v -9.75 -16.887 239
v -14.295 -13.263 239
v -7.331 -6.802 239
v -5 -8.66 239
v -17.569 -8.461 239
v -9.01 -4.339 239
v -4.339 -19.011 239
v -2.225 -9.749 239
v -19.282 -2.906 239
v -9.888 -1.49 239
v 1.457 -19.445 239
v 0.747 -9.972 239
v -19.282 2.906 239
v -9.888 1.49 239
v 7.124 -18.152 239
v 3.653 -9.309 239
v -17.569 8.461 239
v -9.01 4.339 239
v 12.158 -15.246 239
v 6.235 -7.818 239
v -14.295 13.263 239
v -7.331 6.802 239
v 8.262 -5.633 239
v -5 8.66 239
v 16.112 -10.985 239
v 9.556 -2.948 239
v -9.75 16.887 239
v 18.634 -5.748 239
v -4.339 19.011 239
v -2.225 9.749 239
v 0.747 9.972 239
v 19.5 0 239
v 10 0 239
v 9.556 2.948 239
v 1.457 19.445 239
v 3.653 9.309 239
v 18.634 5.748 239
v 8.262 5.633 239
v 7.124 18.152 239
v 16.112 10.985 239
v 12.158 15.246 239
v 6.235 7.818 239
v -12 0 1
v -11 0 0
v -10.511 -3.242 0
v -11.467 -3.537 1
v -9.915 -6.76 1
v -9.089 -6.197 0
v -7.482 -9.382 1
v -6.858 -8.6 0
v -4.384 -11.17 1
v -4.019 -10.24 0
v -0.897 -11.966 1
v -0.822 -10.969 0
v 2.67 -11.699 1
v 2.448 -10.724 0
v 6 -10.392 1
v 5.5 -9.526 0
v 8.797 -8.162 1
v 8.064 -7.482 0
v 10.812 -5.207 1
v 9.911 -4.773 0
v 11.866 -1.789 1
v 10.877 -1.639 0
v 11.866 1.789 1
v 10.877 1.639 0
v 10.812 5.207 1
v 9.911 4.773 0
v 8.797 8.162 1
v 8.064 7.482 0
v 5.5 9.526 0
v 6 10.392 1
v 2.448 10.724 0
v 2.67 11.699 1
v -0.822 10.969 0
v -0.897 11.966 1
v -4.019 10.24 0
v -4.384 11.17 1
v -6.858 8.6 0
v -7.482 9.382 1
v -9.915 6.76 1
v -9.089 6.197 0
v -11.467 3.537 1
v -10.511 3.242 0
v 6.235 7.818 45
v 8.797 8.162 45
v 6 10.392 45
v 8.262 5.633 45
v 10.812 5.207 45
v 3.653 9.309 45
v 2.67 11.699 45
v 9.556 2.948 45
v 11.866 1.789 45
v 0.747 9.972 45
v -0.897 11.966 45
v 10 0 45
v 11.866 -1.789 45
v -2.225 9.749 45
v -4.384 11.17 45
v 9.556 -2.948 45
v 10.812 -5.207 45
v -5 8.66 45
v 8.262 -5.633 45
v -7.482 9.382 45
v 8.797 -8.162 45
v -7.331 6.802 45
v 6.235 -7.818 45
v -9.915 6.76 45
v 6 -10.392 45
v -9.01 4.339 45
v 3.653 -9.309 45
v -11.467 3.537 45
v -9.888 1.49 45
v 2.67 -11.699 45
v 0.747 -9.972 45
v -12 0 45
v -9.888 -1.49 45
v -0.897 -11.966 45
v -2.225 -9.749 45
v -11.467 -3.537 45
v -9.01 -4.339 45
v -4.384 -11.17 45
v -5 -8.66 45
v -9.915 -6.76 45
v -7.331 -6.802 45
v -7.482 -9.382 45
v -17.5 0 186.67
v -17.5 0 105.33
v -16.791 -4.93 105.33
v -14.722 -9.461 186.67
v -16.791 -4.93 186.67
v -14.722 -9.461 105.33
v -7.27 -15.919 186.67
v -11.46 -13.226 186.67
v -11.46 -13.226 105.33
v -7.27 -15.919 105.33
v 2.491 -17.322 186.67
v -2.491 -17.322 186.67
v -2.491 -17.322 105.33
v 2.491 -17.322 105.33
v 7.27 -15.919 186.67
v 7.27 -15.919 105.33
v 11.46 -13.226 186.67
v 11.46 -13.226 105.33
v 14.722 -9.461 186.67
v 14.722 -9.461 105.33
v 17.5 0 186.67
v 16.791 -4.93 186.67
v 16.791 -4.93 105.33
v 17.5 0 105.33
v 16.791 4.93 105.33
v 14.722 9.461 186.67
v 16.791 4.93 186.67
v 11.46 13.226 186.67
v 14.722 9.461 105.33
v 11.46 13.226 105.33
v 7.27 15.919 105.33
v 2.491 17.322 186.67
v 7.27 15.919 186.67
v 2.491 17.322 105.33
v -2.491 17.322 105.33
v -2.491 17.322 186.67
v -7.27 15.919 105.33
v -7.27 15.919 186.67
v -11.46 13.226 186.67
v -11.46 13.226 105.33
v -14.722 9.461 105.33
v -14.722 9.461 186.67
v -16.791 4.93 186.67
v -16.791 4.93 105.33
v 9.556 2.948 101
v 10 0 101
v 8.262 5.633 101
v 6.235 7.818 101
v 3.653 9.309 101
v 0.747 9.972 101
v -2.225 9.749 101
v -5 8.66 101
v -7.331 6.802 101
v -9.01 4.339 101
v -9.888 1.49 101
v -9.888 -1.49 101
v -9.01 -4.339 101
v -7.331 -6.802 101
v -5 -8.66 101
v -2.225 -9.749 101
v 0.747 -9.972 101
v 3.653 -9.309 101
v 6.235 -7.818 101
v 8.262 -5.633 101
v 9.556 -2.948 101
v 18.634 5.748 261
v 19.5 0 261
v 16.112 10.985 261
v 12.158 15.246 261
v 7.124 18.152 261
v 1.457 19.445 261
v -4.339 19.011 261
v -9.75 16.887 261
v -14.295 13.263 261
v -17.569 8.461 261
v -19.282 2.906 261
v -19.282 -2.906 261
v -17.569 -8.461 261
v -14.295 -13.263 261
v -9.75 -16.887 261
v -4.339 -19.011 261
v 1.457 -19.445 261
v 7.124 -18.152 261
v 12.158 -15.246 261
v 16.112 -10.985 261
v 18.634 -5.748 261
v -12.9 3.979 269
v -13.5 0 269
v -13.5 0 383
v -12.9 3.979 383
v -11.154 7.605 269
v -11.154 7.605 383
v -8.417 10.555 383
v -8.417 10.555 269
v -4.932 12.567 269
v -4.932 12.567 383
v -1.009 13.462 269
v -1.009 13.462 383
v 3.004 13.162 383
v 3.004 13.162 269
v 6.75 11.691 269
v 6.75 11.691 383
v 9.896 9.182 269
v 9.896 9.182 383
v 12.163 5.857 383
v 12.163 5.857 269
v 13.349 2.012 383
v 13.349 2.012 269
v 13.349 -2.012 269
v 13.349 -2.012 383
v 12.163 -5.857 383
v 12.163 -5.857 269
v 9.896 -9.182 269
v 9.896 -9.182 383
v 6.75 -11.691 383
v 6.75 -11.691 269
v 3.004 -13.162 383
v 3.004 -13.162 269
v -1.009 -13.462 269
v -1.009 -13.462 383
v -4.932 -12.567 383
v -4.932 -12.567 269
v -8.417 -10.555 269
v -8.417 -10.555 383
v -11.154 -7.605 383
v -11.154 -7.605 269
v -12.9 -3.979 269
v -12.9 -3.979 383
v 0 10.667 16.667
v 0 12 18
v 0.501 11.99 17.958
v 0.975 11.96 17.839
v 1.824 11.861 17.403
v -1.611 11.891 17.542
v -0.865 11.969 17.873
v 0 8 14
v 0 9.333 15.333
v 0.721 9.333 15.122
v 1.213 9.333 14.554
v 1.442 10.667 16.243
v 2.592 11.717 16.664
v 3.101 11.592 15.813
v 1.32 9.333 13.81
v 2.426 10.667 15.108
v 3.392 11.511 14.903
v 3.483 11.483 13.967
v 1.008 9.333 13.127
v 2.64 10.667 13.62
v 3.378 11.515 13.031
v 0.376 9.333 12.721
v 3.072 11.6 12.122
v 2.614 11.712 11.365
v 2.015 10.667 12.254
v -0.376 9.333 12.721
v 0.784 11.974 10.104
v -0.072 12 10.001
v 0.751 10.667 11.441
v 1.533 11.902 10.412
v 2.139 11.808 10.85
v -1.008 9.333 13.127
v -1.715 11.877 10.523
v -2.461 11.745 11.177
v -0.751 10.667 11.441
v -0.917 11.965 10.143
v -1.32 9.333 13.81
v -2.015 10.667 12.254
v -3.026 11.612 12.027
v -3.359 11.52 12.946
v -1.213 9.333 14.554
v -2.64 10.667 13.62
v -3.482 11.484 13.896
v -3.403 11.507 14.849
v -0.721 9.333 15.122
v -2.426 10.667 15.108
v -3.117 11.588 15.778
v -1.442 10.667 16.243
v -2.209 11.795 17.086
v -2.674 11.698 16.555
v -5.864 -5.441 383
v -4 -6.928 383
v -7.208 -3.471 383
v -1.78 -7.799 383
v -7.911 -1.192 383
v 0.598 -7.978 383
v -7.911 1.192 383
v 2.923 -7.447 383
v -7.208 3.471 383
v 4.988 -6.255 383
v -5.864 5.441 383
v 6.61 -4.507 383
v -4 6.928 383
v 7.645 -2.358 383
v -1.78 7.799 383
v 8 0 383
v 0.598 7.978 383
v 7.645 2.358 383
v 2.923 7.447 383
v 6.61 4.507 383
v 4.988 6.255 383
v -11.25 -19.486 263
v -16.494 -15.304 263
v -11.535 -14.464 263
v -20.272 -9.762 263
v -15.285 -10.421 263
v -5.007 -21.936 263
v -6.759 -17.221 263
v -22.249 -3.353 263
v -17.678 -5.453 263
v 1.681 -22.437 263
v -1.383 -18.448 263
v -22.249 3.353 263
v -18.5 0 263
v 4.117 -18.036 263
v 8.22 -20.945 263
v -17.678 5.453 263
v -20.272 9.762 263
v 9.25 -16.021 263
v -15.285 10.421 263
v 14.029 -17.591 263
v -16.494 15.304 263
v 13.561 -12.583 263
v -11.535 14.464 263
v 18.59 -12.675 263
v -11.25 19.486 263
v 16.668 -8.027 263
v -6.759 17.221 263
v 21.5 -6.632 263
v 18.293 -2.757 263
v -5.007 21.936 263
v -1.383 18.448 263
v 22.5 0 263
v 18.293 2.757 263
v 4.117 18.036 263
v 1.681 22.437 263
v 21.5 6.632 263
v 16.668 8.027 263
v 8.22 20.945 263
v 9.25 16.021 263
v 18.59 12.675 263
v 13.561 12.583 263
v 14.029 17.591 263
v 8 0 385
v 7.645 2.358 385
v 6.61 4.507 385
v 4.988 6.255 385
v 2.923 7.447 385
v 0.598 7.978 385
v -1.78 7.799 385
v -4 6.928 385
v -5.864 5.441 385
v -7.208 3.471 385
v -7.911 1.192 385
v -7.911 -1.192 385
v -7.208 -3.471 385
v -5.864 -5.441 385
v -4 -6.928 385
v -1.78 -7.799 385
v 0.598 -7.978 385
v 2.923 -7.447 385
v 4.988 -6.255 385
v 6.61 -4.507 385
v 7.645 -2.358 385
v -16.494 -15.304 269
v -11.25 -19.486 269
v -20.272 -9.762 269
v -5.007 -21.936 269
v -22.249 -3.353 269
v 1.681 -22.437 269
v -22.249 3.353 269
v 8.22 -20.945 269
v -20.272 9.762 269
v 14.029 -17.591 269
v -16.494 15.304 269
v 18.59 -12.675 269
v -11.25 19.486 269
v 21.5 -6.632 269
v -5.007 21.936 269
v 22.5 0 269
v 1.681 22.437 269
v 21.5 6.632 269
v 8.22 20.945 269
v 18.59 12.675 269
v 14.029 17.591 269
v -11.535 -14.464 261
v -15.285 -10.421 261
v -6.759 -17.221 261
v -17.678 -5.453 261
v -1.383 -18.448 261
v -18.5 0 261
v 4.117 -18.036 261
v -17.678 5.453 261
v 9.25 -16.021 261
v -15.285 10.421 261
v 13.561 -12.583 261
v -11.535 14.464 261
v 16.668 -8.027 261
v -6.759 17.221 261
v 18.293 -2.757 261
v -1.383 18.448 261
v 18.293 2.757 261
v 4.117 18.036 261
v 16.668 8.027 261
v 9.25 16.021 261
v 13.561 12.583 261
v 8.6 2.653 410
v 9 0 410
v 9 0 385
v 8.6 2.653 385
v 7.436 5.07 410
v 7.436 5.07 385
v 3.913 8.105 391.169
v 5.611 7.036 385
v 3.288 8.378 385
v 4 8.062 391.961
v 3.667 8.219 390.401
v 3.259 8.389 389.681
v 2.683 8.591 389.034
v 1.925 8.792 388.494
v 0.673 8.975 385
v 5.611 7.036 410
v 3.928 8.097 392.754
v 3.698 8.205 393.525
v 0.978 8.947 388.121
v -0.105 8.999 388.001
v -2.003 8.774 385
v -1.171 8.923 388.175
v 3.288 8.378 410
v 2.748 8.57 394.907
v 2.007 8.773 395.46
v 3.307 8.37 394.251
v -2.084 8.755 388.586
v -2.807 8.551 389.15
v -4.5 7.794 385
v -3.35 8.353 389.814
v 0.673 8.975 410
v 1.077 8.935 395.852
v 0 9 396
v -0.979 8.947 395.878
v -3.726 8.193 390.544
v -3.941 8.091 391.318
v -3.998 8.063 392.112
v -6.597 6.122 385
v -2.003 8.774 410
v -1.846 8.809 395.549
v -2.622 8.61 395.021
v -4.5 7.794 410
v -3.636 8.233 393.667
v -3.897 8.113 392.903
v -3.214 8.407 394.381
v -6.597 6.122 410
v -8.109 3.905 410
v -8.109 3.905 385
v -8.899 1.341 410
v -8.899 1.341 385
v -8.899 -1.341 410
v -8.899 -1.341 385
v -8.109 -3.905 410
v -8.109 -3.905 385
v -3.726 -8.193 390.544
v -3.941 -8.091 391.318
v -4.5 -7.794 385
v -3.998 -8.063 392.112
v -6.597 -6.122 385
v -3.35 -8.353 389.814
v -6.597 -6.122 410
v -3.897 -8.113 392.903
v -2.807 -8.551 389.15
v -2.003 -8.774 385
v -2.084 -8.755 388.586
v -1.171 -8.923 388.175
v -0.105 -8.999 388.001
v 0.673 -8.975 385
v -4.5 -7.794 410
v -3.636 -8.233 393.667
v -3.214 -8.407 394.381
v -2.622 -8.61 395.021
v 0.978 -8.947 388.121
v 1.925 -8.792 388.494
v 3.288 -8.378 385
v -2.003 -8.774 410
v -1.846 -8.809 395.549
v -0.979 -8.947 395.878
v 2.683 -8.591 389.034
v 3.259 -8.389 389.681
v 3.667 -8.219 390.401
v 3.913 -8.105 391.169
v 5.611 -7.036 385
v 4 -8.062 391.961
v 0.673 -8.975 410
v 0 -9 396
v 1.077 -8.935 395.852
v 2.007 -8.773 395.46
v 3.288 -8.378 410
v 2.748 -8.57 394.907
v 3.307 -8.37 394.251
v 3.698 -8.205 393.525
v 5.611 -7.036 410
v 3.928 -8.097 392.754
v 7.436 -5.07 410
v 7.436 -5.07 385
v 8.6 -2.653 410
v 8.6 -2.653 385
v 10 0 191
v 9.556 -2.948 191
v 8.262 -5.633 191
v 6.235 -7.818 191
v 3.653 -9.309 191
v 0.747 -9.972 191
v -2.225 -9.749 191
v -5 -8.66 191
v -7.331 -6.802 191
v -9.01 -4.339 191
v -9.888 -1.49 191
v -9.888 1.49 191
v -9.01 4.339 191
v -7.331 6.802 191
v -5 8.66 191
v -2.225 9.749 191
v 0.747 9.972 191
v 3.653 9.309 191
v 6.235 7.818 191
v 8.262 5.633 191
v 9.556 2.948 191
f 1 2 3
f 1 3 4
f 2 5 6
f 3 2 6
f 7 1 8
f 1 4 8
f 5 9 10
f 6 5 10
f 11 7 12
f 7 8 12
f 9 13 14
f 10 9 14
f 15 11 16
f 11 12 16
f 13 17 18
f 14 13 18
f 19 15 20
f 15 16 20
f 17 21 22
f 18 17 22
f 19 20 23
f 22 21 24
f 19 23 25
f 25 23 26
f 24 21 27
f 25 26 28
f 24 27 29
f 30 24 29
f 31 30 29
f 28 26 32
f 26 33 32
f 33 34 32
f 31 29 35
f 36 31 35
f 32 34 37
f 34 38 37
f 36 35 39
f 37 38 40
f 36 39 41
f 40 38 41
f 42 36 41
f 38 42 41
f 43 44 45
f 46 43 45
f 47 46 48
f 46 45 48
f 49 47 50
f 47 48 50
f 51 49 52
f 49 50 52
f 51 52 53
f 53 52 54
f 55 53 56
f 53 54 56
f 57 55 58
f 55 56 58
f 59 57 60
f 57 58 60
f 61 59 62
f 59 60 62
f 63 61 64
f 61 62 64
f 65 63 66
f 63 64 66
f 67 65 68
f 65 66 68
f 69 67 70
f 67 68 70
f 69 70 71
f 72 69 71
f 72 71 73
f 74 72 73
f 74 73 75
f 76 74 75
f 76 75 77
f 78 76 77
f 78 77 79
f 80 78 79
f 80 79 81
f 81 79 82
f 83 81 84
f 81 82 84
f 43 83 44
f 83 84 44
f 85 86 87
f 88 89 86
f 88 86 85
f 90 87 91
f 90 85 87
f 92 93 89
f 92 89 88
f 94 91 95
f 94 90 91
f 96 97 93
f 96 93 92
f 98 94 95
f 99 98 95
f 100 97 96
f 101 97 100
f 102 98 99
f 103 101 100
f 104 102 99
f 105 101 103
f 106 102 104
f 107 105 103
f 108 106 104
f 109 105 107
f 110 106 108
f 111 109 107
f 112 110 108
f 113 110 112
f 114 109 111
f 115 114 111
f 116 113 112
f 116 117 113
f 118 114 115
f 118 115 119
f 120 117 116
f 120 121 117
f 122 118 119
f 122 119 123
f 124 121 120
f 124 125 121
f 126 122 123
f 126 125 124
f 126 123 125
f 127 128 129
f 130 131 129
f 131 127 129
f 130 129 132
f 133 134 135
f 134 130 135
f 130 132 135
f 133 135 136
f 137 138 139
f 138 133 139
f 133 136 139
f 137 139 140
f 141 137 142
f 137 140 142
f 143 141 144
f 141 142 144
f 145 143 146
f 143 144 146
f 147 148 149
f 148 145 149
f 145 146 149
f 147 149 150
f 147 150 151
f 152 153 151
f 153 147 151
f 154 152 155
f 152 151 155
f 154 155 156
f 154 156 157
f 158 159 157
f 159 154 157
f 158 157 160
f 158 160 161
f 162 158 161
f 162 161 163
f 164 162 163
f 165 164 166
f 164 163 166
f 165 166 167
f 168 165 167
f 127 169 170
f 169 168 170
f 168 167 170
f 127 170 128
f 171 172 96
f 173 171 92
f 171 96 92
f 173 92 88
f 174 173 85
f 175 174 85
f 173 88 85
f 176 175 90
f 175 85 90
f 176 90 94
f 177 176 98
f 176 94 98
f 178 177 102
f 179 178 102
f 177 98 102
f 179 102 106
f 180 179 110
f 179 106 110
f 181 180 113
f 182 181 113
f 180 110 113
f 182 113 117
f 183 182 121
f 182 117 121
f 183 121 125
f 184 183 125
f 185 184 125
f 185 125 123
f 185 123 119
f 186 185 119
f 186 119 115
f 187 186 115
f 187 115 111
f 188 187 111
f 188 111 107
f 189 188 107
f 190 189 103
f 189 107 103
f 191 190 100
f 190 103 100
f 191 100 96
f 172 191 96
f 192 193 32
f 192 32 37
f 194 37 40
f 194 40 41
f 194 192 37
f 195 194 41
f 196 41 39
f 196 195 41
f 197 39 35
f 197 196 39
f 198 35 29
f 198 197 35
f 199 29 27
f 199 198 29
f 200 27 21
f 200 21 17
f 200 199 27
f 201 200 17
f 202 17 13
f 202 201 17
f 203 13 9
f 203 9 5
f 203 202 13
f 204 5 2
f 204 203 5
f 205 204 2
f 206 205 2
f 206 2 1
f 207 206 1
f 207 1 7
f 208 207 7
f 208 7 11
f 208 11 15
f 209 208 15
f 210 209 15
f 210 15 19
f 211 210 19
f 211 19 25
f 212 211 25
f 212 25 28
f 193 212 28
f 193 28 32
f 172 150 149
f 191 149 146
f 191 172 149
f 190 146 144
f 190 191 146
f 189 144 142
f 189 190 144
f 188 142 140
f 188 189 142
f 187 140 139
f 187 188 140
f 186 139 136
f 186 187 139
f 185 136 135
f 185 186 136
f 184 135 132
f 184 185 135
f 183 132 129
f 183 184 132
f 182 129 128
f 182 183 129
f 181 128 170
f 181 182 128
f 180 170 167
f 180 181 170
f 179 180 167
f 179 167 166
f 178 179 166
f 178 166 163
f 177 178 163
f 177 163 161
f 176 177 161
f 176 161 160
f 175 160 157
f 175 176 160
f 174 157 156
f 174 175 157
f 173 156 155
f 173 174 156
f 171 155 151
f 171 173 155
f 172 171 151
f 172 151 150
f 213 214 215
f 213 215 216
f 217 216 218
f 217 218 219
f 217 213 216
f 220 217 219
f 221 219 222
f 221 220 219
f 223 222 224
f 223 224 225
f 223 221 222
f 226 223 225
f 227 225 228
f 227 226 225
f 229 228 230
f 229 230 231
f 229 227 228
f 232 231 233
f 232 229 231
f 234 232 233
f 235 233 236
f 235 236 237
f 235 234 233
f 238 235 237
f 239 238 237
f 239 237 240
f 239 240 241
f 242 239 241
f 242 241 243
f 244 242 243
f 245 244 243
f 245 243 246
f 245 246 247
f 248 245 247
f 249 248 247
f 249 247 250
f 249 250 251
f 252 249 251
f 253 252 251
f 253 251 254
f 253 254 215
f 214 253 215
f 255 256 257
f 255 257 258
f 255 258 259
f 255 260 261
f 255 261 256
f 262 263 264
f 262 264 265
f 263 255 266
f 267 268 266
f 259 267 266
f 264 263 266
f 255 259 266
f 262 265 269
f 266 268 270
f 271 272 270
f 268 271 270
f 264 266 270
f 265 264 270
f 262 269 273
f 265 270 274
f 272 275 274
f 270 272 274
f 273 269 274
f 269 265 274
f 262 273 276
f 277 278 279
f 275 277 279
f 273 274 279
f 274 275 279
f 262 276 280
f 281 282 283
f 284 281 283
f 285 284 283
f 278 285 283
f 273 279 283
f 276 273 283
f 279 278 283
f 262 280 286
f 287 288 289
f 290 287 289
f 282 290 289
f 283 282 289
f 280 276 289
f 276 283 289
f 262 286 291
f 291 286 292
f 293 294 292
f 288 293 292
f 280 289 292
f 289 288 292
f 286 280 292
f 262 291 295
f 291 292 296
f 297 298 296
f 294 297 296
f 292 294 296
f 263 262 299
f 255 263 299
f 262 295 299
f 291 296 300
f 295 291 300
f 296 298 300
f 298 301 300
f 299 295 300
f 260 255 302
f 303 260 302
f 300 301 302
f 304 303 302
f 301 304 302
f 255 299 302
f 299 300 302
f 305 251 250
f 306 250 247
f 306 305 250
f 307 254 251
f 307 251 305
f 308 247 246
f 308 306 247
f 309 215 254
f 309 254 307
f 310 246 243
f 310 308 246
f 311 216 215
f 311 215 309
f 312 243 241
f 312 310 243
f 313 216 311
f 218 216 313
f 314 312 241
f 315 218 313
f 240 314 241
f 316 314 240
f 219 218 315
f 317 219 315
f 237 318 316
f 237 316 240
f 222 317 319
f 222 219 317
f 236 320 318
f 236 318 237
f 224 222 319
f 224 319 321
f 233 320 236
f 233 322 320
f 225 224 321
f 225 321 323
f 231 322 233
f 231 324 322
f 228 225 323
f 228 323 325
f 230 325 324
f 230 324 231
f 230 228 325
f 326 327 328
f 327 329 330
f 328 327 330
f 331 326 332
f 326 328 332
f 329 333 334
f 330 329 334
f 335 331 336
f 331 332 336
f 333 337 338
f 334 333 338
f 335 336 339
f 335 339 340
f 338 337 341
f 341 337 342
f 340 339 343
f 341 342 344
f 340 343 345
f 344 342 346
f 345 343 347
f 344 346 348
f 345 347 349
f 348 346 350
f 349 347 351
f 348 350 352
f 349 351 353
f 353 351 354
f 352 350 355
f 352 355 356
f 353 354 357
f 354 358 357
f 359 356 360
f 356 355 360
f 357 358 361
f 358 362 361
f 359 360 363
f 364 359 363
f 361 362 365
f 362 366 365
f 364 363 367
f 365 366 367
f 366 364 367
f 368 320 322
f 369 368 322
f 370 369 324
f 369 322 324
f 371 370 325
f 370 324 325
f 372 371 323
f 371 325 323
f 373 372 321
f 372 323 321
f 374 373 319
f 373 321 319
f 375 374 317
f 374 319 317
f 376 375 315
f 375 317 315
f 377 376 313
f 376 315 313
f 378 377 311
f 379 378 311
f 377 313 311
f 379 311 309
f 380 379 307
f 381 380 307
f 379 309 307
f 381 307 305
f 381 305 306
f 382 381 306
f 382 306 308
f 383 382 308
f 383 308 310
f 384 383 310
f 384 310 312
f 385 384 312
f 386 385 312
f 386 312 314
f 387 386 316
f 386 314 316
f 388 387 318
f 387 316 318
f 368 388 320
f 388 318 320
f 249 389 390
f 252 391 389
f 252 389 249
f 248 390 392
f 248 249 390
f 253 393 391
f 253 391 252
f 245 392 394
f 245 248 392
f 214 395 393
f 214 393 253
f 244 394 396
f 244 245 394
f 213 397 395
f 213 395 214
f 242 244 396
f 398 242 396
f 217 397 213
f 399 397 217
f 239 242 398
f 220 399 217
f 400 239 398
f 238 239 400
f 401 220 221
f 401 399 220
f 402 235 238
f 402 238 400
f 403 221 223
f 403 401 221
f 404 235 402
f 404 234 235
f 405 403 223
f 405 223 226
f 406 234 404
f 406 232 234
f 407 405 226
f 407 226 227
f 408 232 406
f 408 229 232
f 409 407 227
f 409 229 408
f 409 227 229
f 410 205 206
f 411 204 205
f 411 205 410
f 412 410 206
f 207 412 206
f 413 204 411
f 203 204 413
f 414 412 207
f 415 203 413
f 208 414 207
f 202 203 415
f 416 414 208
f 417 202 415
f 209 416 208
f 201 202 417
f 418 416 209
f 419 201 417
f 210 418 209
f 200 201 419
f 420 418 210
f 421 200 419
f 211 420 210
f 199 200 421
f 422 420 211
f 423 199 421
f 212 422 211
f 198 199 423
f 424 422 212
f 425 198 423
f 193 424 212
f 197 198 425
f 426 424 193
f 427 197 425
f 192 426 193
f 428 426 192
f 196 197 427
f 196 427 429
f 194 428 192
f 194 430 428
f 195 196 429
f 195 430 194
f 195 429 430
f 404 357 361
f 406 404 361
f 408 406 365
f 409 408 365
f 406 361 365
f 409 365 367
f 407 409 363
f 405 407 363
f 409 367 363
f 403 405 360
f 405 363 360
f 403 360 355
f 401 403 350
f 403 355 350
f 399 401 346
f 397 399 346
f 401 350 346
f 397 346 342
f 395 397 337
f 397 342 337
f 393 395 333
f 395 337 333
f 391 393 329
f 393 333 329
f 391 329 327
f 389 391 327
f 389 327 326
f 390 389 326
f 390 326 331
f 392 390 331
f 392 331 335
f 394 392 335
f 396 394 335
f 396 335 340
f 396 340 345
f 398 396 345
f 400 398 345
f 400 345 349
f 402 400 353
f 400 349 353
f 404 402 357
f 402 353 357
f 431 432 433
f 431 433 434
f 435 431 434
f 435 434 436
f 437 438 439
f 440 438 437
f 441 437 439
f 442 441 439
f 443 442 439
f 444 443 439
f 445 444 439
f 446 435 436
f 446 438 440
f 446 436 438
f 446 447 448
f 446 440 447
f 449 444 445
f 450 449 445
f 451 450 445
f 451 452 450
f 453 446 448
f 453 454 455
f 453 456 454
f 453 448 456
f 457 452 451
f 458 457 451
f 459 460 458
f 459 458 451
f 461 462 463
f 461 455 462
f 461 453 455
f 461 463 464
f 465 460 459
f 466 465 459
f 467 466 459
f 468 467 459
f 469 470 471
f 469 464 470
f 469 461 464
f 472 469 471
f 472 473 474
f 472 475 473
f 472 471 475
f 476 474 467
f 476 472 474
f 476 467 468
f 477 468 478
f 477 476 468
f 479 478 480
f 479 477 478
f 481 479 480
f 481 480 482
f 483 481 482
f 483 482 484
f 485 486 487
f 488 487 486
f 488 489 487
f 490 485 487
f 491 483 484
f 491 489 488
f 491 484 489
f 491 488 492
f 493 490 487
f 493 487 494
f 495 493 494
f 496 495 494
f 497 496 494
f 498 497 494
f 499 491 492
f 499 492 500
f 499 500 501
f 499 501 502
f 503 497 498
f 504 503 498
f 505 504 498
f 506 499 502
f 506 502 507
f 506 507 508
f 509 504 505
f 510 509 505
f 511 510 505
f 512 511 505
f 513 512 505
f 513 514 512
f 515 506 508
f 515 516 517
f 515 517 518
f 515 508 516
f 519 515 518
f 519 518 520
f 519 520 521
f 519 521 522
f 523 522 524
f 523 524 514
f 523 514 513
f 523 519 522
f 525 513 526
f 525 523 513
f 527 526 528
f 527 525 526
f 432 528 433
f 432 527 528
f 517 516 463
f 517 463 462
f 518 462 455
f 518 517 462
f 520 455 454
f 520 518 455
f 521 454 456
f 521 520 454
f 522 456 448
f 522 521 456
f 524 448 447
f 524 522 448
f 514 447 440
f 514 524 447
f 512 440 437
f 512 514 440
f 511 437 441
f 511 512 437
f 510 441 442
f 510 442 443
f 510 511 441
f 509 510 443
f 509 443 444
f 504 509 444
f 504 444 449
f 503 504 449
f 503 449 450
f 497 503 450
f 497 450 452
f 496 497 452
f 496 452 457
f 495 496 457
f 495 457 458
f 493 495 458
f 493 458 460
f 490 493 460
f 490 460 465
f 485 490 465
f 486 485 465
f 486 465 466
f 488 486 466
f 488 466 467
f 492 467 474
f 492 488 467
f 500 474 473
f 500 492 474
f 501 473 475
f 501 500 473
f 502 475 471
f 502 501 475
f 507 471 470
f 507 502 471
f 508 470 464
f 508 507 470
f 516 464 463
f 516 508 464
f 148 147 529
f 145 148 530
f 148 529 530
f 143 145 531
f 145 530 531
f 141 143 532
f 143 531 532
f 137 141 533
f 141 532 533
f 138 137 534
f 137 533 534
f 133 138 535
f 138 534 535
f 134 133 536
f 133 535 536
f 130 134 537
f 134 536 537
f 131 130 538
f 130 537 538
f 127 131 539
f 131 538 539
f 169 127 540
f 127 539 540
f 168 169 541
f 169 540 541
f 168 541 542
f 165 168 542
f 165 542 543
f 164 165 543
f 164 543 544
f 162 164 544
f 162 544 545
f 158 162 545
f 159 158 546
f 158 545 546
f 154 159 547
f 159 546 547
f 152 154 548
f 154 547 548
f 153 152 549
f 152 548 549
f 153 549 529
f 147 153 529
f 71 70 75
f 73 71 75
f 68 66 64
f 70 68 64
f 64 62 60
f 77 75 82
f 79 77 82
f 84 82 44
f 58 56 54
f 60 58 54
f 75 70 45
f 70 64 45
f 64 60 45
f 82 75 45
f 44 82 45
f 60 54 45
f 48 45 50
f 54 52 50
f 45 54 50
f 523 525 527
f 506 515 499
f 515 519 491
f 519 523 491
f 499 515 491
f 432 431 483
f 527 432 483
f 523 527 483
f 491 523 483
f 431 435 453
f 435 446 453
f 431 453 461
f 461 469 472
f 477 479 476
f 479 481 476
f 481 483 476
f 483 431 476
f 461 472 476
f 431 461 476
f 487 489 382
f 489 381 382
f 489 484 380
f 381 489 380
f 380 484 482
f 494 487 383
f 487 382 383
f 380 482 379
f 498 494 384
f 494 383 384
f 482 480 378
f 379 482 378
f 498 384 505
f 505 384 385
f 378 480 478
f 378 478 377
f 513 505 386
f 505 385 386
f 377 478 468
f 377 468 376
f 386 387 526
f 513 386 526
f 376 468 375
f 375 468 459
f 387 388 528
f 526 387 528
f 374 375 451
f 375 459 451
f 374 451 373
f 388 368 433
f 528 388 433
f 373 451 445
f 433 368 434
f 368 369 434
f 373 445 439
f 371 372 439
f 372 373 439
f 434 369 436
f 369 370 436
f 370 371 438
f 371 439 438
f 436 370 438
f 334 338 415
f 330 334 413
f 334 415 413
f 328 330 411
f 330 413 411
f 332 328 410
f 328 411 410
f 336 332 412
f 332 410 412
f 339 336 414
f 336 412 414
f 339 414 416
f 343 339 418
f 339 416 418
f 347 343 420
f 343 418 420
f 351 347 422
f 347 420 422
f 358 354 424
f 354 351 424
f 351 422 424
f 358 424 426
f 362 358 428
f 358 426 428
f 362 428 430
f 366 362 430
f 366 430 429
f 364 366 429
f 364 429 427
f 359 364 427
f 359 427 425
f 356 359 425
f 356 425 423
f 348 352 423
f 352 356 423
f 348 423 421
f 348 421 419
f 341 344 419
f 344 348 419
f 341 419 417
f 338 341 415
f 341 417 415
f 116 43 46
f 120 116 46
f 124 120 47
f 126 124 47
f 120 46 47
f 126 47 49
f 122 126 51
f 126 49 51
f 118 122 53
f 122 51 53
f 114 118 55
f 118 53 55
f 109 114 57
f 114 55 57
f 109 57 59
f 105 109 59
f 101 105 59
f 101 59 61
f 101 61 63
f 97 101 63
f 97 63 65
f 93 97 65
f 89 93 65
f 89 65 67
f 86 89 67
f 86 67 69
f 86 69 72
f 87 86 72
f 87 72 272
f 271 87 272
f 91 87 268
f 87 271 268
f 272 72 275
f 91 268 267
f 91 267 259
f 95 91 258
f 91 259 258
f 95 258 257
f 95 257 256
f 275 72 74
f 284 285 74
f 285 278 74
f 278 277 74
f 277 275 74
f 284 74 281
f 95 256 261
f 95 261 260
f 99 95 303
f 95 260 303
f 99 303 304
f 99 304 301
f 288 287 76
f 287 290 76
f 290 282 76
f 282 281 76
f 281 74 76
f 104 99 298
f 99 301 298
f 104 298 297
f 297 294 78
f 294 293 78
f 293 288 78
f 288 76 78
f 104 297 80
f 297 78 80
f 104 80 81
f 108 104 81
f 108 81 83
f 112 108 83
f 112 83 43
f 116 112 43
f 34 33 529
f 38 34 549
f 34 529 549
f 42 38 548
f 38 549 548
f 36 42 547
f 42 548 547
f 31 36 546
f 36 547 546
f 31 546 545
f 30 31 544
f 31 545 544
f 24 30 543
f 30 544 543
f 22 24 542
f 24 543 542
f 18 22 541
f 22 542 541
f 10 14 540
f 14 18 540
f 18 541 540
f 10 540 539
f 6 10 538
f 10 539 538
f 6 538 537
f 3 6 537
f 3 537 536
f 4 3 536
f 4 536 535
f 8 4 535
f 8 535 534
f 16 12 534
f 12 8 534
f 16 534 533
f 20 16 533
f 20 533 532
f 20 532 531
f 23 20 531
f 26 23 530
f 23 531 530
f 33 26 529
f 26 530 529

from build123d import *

# Parameters (mm, degrees)
SKETCH_1_R               = 12
EXTRUDE_1_DEPTH          = 45
SKETCH_2_R               = 10
EXTRUDE_2_DEPTH          = 56
SKETCH_3_R               = 17.5
EXTRUDE_3_DEPTH          = 90
SKETCH_4_R               = 10
EXTRUDE_4_DEPTH          = 72
SKETCH_5_R               = 19.5
EXTRUDE_5_DEPTH          = 24
CUT_EXTRUDE_1_DEPTH      = 265.441865067
CUT_EXTRUDE_1_DEPTH_BACK = 2
SKETCH_6_OUTSIDE_W       = 94.744
SKETCH_6_OUTSIDE_H       = 94.744
SKETCH_6_OUTSIDE_R       = 18.5
SKETCH_7_R               = 22.5
EXTRUDE_6_DEPTH          = 6
SKETCH_8_R               = 13.5
EXTRUDE_7_DEPTH          = 147
SKETCH_10_OUTSIDE_W      = 129.982
SKETCH_10_OUTSIDE_H      = 129.982
SKETCH_10_OUTSIDE_R      = 9
CUT_EXTRUDE_2_DEPTH      = 27
SKETCH_11_OUTSIDE_W      = 129.982
SKETCH_11_OUTSIDE_H      = 129.982
SKETCH_11_OUTSIDE_R      = 8
CUT_EXTRUDE_3_DEPTH      = 2
CHAMFER_1_SIZE           = 1
CUT_EXTRUDE_4_DEPTH      = 412.23290238
CUT_EXTRUDE_4_DEPTH_BACK = 412.23290238
SKETCH_15_R              = 4


with BuildPart() as part:
    # 草图1 → 凸台-拉伸1 (new body)
    with BuildSketch(Plane.XY):
        with Locations(Location((0, 0, 0), (0, 0, 180))):
            Circle(SKETCH_1_R)
    extrude(amount=EXTRUDE_1_DEPTH)

    # 草图2 → 凸台-拉伸2 (add)
    with BuildSketch(Plane.XY.offset(45)):
        Circle(SKETCH_2_R)
    extrude(amount=EXTRUDE_2_DEPTH)

    # 草图3 → 凸台-拉伸3 (add)
    with BuildSketch(Plane.XY.offset(101)):
        with Locations(Location((0, 0, 0), (0, 0, 180))):
            Circle(SKETCH_3_R)
    extrude(amount=EXTRUDE_3_DEPTH)

    # 草图4 → 凸台-拉伸4 (add)
    with BuildSketch(Plane.XY.offset(191)):
        Circle(SKETCH_4_R)
    extrude(amount=EXTRUDE_4_DEPTH)

    # 草图5 → 凸台-拉伸5 (add)
    with BuildSketch(Plane.XY.offset(263)):
        Circle(SKETCH_5_R)
    extrude(amount=-EXTRUDE_5_DEPTH)

    # 草图6 outside → 切除-拉伸1 (cut, two sides: drawn at the far end of the back side and taken through both)
    with BuildSketch(Plane.XY.offset(263).offset(-CUT_EXTRUDE_1_DEPTH_BACK)):
        Rectangle(SKETCH_6_OUTSIDE_W, SKETCH_6_OUTSIDE_H)
        with Locations(Location((0, 0, 0), (0, 0, 180))):
            Circle(SKETCH_6_OUTSIDE_R, mode=Mode.SUBTRACT)
    extrude(amount=CUT_EXTRUDE_1_DEPTH + CUT_EXTRUDE_1_DEPTH_BACK, mode=Mode.SUBTRACT)

    # 草图7 → 凸台-拉伸6 (add)
    with BuildSketch(Plane.XY.offset(263)):
        Circle(SKETCH_7_R)
    extrude(amount=EXTRUDE_6_DEPTH)

    # 草图8 → 凸台-拉伸7 (add)
    with BuildSketch(Plane(origin=(0, 0, 263), x_dir=(-1, 0, 0), z_dir=(0, 0, -1))):
        Circle(SKETCH_8_R)
    extrude(amount=-EXTRUDE_7_DEPTH)

    # 草图10 outside → 切除-拉伸2 (cut)
    with BuildSketch(Plane.XY.offset(410)):
        Rectangle(SKETCH_10_OUTSIDE_W, SKETCH_10_OUTSIDE_H)
        Circle(SKETCH_10_OUTSIDE_R, mode=Mode.SUBTRACT)
    extrude(amount=-CUT_EXTRUDE_2_DEPTH, mode=Mode.SUBTRACT)

    # 草图11 outside → 切除-拉伸3 (cut)
    with BuildSketch(Plane.XY.offset(383)):
        Rectangle(SKETCH_11_OUTSIDE_W, SKETCH_11_OUTSIDE_H)
        Circle(SKETCH_11_OUTSIDE_R, mode=Mode.SUBTRACT)
    extrude(amount=CUT_EXTRUDE_3_DEPTH, mode=Mode.SUBTRACT)

    # 草图12 → 切除-旋转1 (revolve, cut)
    with BuildSketch(Plane(origin=(0, 0, 0), x_dir=(0, 0, -1), z_dir=(1, 0, 0)), mode=Mode.PRIVATE) as cut_revolve_1_sk:
        Polygon((-105.330127019, 17.5), (-101, 10), (-101, 17.5), align=None)
        Polygon((-191, 10), (-191, 17.5), (-186.669872981, 17.5), align=None)
    revolve(cut_revolve_1_sk.sketch.rotate(Axis((0, 0, 181.277430572), (0, 0, -1)), 90), axis=Axis((0, 0, 181.277430572), (0, 0, -1)), mode=Mode.SUBTRACT)

    # 倒角1
    chamfer_1_edges = [part.edges().sort_by_distance(p)[0] for p in [
        (12, 0, 0),
    ]]
    chamfer(chamfer_1_edges, length=CHAMFER_1_SIZE)

    # 草图14 → 切除-旋转2 (revolve, cut)
    with BuildSketch(Plane(origin=(0, 0, 0), x_dir=(0, 0, -1), z_dir=(1, 0, 0))):
        Polygon((-14, 8), (-23.293093205, 17.293093205), (-14, 17.293093205), align=None)
    revolve(axis=Axis((0, -18.394712119, 14), (0, 1, 0)), mode=Mode.SUBTRACT)

    # 草图15 → 切除-拉伸4 (cut, two sides: drawn at the far end of the back side and taken through both)
    with BuildSketch(Plane(origin=(0, 0, 0), x_dir=(1, 0, 0), z_dir=(0, 1, 0)).offset(-CUT_EXTRUDE_4_DEPTH_BACK)):
        with Locations(Location((0, -392, 0), (0, 0, 270))):
            Circle(SKETCH_15_R)
    extrude(amount=CUT_EXTRUDE_4_DEPTH + CUT_EXTRUDE_4_DEPTH_BACK, mode=Mode.SUBTRACT)


solid = part.part
